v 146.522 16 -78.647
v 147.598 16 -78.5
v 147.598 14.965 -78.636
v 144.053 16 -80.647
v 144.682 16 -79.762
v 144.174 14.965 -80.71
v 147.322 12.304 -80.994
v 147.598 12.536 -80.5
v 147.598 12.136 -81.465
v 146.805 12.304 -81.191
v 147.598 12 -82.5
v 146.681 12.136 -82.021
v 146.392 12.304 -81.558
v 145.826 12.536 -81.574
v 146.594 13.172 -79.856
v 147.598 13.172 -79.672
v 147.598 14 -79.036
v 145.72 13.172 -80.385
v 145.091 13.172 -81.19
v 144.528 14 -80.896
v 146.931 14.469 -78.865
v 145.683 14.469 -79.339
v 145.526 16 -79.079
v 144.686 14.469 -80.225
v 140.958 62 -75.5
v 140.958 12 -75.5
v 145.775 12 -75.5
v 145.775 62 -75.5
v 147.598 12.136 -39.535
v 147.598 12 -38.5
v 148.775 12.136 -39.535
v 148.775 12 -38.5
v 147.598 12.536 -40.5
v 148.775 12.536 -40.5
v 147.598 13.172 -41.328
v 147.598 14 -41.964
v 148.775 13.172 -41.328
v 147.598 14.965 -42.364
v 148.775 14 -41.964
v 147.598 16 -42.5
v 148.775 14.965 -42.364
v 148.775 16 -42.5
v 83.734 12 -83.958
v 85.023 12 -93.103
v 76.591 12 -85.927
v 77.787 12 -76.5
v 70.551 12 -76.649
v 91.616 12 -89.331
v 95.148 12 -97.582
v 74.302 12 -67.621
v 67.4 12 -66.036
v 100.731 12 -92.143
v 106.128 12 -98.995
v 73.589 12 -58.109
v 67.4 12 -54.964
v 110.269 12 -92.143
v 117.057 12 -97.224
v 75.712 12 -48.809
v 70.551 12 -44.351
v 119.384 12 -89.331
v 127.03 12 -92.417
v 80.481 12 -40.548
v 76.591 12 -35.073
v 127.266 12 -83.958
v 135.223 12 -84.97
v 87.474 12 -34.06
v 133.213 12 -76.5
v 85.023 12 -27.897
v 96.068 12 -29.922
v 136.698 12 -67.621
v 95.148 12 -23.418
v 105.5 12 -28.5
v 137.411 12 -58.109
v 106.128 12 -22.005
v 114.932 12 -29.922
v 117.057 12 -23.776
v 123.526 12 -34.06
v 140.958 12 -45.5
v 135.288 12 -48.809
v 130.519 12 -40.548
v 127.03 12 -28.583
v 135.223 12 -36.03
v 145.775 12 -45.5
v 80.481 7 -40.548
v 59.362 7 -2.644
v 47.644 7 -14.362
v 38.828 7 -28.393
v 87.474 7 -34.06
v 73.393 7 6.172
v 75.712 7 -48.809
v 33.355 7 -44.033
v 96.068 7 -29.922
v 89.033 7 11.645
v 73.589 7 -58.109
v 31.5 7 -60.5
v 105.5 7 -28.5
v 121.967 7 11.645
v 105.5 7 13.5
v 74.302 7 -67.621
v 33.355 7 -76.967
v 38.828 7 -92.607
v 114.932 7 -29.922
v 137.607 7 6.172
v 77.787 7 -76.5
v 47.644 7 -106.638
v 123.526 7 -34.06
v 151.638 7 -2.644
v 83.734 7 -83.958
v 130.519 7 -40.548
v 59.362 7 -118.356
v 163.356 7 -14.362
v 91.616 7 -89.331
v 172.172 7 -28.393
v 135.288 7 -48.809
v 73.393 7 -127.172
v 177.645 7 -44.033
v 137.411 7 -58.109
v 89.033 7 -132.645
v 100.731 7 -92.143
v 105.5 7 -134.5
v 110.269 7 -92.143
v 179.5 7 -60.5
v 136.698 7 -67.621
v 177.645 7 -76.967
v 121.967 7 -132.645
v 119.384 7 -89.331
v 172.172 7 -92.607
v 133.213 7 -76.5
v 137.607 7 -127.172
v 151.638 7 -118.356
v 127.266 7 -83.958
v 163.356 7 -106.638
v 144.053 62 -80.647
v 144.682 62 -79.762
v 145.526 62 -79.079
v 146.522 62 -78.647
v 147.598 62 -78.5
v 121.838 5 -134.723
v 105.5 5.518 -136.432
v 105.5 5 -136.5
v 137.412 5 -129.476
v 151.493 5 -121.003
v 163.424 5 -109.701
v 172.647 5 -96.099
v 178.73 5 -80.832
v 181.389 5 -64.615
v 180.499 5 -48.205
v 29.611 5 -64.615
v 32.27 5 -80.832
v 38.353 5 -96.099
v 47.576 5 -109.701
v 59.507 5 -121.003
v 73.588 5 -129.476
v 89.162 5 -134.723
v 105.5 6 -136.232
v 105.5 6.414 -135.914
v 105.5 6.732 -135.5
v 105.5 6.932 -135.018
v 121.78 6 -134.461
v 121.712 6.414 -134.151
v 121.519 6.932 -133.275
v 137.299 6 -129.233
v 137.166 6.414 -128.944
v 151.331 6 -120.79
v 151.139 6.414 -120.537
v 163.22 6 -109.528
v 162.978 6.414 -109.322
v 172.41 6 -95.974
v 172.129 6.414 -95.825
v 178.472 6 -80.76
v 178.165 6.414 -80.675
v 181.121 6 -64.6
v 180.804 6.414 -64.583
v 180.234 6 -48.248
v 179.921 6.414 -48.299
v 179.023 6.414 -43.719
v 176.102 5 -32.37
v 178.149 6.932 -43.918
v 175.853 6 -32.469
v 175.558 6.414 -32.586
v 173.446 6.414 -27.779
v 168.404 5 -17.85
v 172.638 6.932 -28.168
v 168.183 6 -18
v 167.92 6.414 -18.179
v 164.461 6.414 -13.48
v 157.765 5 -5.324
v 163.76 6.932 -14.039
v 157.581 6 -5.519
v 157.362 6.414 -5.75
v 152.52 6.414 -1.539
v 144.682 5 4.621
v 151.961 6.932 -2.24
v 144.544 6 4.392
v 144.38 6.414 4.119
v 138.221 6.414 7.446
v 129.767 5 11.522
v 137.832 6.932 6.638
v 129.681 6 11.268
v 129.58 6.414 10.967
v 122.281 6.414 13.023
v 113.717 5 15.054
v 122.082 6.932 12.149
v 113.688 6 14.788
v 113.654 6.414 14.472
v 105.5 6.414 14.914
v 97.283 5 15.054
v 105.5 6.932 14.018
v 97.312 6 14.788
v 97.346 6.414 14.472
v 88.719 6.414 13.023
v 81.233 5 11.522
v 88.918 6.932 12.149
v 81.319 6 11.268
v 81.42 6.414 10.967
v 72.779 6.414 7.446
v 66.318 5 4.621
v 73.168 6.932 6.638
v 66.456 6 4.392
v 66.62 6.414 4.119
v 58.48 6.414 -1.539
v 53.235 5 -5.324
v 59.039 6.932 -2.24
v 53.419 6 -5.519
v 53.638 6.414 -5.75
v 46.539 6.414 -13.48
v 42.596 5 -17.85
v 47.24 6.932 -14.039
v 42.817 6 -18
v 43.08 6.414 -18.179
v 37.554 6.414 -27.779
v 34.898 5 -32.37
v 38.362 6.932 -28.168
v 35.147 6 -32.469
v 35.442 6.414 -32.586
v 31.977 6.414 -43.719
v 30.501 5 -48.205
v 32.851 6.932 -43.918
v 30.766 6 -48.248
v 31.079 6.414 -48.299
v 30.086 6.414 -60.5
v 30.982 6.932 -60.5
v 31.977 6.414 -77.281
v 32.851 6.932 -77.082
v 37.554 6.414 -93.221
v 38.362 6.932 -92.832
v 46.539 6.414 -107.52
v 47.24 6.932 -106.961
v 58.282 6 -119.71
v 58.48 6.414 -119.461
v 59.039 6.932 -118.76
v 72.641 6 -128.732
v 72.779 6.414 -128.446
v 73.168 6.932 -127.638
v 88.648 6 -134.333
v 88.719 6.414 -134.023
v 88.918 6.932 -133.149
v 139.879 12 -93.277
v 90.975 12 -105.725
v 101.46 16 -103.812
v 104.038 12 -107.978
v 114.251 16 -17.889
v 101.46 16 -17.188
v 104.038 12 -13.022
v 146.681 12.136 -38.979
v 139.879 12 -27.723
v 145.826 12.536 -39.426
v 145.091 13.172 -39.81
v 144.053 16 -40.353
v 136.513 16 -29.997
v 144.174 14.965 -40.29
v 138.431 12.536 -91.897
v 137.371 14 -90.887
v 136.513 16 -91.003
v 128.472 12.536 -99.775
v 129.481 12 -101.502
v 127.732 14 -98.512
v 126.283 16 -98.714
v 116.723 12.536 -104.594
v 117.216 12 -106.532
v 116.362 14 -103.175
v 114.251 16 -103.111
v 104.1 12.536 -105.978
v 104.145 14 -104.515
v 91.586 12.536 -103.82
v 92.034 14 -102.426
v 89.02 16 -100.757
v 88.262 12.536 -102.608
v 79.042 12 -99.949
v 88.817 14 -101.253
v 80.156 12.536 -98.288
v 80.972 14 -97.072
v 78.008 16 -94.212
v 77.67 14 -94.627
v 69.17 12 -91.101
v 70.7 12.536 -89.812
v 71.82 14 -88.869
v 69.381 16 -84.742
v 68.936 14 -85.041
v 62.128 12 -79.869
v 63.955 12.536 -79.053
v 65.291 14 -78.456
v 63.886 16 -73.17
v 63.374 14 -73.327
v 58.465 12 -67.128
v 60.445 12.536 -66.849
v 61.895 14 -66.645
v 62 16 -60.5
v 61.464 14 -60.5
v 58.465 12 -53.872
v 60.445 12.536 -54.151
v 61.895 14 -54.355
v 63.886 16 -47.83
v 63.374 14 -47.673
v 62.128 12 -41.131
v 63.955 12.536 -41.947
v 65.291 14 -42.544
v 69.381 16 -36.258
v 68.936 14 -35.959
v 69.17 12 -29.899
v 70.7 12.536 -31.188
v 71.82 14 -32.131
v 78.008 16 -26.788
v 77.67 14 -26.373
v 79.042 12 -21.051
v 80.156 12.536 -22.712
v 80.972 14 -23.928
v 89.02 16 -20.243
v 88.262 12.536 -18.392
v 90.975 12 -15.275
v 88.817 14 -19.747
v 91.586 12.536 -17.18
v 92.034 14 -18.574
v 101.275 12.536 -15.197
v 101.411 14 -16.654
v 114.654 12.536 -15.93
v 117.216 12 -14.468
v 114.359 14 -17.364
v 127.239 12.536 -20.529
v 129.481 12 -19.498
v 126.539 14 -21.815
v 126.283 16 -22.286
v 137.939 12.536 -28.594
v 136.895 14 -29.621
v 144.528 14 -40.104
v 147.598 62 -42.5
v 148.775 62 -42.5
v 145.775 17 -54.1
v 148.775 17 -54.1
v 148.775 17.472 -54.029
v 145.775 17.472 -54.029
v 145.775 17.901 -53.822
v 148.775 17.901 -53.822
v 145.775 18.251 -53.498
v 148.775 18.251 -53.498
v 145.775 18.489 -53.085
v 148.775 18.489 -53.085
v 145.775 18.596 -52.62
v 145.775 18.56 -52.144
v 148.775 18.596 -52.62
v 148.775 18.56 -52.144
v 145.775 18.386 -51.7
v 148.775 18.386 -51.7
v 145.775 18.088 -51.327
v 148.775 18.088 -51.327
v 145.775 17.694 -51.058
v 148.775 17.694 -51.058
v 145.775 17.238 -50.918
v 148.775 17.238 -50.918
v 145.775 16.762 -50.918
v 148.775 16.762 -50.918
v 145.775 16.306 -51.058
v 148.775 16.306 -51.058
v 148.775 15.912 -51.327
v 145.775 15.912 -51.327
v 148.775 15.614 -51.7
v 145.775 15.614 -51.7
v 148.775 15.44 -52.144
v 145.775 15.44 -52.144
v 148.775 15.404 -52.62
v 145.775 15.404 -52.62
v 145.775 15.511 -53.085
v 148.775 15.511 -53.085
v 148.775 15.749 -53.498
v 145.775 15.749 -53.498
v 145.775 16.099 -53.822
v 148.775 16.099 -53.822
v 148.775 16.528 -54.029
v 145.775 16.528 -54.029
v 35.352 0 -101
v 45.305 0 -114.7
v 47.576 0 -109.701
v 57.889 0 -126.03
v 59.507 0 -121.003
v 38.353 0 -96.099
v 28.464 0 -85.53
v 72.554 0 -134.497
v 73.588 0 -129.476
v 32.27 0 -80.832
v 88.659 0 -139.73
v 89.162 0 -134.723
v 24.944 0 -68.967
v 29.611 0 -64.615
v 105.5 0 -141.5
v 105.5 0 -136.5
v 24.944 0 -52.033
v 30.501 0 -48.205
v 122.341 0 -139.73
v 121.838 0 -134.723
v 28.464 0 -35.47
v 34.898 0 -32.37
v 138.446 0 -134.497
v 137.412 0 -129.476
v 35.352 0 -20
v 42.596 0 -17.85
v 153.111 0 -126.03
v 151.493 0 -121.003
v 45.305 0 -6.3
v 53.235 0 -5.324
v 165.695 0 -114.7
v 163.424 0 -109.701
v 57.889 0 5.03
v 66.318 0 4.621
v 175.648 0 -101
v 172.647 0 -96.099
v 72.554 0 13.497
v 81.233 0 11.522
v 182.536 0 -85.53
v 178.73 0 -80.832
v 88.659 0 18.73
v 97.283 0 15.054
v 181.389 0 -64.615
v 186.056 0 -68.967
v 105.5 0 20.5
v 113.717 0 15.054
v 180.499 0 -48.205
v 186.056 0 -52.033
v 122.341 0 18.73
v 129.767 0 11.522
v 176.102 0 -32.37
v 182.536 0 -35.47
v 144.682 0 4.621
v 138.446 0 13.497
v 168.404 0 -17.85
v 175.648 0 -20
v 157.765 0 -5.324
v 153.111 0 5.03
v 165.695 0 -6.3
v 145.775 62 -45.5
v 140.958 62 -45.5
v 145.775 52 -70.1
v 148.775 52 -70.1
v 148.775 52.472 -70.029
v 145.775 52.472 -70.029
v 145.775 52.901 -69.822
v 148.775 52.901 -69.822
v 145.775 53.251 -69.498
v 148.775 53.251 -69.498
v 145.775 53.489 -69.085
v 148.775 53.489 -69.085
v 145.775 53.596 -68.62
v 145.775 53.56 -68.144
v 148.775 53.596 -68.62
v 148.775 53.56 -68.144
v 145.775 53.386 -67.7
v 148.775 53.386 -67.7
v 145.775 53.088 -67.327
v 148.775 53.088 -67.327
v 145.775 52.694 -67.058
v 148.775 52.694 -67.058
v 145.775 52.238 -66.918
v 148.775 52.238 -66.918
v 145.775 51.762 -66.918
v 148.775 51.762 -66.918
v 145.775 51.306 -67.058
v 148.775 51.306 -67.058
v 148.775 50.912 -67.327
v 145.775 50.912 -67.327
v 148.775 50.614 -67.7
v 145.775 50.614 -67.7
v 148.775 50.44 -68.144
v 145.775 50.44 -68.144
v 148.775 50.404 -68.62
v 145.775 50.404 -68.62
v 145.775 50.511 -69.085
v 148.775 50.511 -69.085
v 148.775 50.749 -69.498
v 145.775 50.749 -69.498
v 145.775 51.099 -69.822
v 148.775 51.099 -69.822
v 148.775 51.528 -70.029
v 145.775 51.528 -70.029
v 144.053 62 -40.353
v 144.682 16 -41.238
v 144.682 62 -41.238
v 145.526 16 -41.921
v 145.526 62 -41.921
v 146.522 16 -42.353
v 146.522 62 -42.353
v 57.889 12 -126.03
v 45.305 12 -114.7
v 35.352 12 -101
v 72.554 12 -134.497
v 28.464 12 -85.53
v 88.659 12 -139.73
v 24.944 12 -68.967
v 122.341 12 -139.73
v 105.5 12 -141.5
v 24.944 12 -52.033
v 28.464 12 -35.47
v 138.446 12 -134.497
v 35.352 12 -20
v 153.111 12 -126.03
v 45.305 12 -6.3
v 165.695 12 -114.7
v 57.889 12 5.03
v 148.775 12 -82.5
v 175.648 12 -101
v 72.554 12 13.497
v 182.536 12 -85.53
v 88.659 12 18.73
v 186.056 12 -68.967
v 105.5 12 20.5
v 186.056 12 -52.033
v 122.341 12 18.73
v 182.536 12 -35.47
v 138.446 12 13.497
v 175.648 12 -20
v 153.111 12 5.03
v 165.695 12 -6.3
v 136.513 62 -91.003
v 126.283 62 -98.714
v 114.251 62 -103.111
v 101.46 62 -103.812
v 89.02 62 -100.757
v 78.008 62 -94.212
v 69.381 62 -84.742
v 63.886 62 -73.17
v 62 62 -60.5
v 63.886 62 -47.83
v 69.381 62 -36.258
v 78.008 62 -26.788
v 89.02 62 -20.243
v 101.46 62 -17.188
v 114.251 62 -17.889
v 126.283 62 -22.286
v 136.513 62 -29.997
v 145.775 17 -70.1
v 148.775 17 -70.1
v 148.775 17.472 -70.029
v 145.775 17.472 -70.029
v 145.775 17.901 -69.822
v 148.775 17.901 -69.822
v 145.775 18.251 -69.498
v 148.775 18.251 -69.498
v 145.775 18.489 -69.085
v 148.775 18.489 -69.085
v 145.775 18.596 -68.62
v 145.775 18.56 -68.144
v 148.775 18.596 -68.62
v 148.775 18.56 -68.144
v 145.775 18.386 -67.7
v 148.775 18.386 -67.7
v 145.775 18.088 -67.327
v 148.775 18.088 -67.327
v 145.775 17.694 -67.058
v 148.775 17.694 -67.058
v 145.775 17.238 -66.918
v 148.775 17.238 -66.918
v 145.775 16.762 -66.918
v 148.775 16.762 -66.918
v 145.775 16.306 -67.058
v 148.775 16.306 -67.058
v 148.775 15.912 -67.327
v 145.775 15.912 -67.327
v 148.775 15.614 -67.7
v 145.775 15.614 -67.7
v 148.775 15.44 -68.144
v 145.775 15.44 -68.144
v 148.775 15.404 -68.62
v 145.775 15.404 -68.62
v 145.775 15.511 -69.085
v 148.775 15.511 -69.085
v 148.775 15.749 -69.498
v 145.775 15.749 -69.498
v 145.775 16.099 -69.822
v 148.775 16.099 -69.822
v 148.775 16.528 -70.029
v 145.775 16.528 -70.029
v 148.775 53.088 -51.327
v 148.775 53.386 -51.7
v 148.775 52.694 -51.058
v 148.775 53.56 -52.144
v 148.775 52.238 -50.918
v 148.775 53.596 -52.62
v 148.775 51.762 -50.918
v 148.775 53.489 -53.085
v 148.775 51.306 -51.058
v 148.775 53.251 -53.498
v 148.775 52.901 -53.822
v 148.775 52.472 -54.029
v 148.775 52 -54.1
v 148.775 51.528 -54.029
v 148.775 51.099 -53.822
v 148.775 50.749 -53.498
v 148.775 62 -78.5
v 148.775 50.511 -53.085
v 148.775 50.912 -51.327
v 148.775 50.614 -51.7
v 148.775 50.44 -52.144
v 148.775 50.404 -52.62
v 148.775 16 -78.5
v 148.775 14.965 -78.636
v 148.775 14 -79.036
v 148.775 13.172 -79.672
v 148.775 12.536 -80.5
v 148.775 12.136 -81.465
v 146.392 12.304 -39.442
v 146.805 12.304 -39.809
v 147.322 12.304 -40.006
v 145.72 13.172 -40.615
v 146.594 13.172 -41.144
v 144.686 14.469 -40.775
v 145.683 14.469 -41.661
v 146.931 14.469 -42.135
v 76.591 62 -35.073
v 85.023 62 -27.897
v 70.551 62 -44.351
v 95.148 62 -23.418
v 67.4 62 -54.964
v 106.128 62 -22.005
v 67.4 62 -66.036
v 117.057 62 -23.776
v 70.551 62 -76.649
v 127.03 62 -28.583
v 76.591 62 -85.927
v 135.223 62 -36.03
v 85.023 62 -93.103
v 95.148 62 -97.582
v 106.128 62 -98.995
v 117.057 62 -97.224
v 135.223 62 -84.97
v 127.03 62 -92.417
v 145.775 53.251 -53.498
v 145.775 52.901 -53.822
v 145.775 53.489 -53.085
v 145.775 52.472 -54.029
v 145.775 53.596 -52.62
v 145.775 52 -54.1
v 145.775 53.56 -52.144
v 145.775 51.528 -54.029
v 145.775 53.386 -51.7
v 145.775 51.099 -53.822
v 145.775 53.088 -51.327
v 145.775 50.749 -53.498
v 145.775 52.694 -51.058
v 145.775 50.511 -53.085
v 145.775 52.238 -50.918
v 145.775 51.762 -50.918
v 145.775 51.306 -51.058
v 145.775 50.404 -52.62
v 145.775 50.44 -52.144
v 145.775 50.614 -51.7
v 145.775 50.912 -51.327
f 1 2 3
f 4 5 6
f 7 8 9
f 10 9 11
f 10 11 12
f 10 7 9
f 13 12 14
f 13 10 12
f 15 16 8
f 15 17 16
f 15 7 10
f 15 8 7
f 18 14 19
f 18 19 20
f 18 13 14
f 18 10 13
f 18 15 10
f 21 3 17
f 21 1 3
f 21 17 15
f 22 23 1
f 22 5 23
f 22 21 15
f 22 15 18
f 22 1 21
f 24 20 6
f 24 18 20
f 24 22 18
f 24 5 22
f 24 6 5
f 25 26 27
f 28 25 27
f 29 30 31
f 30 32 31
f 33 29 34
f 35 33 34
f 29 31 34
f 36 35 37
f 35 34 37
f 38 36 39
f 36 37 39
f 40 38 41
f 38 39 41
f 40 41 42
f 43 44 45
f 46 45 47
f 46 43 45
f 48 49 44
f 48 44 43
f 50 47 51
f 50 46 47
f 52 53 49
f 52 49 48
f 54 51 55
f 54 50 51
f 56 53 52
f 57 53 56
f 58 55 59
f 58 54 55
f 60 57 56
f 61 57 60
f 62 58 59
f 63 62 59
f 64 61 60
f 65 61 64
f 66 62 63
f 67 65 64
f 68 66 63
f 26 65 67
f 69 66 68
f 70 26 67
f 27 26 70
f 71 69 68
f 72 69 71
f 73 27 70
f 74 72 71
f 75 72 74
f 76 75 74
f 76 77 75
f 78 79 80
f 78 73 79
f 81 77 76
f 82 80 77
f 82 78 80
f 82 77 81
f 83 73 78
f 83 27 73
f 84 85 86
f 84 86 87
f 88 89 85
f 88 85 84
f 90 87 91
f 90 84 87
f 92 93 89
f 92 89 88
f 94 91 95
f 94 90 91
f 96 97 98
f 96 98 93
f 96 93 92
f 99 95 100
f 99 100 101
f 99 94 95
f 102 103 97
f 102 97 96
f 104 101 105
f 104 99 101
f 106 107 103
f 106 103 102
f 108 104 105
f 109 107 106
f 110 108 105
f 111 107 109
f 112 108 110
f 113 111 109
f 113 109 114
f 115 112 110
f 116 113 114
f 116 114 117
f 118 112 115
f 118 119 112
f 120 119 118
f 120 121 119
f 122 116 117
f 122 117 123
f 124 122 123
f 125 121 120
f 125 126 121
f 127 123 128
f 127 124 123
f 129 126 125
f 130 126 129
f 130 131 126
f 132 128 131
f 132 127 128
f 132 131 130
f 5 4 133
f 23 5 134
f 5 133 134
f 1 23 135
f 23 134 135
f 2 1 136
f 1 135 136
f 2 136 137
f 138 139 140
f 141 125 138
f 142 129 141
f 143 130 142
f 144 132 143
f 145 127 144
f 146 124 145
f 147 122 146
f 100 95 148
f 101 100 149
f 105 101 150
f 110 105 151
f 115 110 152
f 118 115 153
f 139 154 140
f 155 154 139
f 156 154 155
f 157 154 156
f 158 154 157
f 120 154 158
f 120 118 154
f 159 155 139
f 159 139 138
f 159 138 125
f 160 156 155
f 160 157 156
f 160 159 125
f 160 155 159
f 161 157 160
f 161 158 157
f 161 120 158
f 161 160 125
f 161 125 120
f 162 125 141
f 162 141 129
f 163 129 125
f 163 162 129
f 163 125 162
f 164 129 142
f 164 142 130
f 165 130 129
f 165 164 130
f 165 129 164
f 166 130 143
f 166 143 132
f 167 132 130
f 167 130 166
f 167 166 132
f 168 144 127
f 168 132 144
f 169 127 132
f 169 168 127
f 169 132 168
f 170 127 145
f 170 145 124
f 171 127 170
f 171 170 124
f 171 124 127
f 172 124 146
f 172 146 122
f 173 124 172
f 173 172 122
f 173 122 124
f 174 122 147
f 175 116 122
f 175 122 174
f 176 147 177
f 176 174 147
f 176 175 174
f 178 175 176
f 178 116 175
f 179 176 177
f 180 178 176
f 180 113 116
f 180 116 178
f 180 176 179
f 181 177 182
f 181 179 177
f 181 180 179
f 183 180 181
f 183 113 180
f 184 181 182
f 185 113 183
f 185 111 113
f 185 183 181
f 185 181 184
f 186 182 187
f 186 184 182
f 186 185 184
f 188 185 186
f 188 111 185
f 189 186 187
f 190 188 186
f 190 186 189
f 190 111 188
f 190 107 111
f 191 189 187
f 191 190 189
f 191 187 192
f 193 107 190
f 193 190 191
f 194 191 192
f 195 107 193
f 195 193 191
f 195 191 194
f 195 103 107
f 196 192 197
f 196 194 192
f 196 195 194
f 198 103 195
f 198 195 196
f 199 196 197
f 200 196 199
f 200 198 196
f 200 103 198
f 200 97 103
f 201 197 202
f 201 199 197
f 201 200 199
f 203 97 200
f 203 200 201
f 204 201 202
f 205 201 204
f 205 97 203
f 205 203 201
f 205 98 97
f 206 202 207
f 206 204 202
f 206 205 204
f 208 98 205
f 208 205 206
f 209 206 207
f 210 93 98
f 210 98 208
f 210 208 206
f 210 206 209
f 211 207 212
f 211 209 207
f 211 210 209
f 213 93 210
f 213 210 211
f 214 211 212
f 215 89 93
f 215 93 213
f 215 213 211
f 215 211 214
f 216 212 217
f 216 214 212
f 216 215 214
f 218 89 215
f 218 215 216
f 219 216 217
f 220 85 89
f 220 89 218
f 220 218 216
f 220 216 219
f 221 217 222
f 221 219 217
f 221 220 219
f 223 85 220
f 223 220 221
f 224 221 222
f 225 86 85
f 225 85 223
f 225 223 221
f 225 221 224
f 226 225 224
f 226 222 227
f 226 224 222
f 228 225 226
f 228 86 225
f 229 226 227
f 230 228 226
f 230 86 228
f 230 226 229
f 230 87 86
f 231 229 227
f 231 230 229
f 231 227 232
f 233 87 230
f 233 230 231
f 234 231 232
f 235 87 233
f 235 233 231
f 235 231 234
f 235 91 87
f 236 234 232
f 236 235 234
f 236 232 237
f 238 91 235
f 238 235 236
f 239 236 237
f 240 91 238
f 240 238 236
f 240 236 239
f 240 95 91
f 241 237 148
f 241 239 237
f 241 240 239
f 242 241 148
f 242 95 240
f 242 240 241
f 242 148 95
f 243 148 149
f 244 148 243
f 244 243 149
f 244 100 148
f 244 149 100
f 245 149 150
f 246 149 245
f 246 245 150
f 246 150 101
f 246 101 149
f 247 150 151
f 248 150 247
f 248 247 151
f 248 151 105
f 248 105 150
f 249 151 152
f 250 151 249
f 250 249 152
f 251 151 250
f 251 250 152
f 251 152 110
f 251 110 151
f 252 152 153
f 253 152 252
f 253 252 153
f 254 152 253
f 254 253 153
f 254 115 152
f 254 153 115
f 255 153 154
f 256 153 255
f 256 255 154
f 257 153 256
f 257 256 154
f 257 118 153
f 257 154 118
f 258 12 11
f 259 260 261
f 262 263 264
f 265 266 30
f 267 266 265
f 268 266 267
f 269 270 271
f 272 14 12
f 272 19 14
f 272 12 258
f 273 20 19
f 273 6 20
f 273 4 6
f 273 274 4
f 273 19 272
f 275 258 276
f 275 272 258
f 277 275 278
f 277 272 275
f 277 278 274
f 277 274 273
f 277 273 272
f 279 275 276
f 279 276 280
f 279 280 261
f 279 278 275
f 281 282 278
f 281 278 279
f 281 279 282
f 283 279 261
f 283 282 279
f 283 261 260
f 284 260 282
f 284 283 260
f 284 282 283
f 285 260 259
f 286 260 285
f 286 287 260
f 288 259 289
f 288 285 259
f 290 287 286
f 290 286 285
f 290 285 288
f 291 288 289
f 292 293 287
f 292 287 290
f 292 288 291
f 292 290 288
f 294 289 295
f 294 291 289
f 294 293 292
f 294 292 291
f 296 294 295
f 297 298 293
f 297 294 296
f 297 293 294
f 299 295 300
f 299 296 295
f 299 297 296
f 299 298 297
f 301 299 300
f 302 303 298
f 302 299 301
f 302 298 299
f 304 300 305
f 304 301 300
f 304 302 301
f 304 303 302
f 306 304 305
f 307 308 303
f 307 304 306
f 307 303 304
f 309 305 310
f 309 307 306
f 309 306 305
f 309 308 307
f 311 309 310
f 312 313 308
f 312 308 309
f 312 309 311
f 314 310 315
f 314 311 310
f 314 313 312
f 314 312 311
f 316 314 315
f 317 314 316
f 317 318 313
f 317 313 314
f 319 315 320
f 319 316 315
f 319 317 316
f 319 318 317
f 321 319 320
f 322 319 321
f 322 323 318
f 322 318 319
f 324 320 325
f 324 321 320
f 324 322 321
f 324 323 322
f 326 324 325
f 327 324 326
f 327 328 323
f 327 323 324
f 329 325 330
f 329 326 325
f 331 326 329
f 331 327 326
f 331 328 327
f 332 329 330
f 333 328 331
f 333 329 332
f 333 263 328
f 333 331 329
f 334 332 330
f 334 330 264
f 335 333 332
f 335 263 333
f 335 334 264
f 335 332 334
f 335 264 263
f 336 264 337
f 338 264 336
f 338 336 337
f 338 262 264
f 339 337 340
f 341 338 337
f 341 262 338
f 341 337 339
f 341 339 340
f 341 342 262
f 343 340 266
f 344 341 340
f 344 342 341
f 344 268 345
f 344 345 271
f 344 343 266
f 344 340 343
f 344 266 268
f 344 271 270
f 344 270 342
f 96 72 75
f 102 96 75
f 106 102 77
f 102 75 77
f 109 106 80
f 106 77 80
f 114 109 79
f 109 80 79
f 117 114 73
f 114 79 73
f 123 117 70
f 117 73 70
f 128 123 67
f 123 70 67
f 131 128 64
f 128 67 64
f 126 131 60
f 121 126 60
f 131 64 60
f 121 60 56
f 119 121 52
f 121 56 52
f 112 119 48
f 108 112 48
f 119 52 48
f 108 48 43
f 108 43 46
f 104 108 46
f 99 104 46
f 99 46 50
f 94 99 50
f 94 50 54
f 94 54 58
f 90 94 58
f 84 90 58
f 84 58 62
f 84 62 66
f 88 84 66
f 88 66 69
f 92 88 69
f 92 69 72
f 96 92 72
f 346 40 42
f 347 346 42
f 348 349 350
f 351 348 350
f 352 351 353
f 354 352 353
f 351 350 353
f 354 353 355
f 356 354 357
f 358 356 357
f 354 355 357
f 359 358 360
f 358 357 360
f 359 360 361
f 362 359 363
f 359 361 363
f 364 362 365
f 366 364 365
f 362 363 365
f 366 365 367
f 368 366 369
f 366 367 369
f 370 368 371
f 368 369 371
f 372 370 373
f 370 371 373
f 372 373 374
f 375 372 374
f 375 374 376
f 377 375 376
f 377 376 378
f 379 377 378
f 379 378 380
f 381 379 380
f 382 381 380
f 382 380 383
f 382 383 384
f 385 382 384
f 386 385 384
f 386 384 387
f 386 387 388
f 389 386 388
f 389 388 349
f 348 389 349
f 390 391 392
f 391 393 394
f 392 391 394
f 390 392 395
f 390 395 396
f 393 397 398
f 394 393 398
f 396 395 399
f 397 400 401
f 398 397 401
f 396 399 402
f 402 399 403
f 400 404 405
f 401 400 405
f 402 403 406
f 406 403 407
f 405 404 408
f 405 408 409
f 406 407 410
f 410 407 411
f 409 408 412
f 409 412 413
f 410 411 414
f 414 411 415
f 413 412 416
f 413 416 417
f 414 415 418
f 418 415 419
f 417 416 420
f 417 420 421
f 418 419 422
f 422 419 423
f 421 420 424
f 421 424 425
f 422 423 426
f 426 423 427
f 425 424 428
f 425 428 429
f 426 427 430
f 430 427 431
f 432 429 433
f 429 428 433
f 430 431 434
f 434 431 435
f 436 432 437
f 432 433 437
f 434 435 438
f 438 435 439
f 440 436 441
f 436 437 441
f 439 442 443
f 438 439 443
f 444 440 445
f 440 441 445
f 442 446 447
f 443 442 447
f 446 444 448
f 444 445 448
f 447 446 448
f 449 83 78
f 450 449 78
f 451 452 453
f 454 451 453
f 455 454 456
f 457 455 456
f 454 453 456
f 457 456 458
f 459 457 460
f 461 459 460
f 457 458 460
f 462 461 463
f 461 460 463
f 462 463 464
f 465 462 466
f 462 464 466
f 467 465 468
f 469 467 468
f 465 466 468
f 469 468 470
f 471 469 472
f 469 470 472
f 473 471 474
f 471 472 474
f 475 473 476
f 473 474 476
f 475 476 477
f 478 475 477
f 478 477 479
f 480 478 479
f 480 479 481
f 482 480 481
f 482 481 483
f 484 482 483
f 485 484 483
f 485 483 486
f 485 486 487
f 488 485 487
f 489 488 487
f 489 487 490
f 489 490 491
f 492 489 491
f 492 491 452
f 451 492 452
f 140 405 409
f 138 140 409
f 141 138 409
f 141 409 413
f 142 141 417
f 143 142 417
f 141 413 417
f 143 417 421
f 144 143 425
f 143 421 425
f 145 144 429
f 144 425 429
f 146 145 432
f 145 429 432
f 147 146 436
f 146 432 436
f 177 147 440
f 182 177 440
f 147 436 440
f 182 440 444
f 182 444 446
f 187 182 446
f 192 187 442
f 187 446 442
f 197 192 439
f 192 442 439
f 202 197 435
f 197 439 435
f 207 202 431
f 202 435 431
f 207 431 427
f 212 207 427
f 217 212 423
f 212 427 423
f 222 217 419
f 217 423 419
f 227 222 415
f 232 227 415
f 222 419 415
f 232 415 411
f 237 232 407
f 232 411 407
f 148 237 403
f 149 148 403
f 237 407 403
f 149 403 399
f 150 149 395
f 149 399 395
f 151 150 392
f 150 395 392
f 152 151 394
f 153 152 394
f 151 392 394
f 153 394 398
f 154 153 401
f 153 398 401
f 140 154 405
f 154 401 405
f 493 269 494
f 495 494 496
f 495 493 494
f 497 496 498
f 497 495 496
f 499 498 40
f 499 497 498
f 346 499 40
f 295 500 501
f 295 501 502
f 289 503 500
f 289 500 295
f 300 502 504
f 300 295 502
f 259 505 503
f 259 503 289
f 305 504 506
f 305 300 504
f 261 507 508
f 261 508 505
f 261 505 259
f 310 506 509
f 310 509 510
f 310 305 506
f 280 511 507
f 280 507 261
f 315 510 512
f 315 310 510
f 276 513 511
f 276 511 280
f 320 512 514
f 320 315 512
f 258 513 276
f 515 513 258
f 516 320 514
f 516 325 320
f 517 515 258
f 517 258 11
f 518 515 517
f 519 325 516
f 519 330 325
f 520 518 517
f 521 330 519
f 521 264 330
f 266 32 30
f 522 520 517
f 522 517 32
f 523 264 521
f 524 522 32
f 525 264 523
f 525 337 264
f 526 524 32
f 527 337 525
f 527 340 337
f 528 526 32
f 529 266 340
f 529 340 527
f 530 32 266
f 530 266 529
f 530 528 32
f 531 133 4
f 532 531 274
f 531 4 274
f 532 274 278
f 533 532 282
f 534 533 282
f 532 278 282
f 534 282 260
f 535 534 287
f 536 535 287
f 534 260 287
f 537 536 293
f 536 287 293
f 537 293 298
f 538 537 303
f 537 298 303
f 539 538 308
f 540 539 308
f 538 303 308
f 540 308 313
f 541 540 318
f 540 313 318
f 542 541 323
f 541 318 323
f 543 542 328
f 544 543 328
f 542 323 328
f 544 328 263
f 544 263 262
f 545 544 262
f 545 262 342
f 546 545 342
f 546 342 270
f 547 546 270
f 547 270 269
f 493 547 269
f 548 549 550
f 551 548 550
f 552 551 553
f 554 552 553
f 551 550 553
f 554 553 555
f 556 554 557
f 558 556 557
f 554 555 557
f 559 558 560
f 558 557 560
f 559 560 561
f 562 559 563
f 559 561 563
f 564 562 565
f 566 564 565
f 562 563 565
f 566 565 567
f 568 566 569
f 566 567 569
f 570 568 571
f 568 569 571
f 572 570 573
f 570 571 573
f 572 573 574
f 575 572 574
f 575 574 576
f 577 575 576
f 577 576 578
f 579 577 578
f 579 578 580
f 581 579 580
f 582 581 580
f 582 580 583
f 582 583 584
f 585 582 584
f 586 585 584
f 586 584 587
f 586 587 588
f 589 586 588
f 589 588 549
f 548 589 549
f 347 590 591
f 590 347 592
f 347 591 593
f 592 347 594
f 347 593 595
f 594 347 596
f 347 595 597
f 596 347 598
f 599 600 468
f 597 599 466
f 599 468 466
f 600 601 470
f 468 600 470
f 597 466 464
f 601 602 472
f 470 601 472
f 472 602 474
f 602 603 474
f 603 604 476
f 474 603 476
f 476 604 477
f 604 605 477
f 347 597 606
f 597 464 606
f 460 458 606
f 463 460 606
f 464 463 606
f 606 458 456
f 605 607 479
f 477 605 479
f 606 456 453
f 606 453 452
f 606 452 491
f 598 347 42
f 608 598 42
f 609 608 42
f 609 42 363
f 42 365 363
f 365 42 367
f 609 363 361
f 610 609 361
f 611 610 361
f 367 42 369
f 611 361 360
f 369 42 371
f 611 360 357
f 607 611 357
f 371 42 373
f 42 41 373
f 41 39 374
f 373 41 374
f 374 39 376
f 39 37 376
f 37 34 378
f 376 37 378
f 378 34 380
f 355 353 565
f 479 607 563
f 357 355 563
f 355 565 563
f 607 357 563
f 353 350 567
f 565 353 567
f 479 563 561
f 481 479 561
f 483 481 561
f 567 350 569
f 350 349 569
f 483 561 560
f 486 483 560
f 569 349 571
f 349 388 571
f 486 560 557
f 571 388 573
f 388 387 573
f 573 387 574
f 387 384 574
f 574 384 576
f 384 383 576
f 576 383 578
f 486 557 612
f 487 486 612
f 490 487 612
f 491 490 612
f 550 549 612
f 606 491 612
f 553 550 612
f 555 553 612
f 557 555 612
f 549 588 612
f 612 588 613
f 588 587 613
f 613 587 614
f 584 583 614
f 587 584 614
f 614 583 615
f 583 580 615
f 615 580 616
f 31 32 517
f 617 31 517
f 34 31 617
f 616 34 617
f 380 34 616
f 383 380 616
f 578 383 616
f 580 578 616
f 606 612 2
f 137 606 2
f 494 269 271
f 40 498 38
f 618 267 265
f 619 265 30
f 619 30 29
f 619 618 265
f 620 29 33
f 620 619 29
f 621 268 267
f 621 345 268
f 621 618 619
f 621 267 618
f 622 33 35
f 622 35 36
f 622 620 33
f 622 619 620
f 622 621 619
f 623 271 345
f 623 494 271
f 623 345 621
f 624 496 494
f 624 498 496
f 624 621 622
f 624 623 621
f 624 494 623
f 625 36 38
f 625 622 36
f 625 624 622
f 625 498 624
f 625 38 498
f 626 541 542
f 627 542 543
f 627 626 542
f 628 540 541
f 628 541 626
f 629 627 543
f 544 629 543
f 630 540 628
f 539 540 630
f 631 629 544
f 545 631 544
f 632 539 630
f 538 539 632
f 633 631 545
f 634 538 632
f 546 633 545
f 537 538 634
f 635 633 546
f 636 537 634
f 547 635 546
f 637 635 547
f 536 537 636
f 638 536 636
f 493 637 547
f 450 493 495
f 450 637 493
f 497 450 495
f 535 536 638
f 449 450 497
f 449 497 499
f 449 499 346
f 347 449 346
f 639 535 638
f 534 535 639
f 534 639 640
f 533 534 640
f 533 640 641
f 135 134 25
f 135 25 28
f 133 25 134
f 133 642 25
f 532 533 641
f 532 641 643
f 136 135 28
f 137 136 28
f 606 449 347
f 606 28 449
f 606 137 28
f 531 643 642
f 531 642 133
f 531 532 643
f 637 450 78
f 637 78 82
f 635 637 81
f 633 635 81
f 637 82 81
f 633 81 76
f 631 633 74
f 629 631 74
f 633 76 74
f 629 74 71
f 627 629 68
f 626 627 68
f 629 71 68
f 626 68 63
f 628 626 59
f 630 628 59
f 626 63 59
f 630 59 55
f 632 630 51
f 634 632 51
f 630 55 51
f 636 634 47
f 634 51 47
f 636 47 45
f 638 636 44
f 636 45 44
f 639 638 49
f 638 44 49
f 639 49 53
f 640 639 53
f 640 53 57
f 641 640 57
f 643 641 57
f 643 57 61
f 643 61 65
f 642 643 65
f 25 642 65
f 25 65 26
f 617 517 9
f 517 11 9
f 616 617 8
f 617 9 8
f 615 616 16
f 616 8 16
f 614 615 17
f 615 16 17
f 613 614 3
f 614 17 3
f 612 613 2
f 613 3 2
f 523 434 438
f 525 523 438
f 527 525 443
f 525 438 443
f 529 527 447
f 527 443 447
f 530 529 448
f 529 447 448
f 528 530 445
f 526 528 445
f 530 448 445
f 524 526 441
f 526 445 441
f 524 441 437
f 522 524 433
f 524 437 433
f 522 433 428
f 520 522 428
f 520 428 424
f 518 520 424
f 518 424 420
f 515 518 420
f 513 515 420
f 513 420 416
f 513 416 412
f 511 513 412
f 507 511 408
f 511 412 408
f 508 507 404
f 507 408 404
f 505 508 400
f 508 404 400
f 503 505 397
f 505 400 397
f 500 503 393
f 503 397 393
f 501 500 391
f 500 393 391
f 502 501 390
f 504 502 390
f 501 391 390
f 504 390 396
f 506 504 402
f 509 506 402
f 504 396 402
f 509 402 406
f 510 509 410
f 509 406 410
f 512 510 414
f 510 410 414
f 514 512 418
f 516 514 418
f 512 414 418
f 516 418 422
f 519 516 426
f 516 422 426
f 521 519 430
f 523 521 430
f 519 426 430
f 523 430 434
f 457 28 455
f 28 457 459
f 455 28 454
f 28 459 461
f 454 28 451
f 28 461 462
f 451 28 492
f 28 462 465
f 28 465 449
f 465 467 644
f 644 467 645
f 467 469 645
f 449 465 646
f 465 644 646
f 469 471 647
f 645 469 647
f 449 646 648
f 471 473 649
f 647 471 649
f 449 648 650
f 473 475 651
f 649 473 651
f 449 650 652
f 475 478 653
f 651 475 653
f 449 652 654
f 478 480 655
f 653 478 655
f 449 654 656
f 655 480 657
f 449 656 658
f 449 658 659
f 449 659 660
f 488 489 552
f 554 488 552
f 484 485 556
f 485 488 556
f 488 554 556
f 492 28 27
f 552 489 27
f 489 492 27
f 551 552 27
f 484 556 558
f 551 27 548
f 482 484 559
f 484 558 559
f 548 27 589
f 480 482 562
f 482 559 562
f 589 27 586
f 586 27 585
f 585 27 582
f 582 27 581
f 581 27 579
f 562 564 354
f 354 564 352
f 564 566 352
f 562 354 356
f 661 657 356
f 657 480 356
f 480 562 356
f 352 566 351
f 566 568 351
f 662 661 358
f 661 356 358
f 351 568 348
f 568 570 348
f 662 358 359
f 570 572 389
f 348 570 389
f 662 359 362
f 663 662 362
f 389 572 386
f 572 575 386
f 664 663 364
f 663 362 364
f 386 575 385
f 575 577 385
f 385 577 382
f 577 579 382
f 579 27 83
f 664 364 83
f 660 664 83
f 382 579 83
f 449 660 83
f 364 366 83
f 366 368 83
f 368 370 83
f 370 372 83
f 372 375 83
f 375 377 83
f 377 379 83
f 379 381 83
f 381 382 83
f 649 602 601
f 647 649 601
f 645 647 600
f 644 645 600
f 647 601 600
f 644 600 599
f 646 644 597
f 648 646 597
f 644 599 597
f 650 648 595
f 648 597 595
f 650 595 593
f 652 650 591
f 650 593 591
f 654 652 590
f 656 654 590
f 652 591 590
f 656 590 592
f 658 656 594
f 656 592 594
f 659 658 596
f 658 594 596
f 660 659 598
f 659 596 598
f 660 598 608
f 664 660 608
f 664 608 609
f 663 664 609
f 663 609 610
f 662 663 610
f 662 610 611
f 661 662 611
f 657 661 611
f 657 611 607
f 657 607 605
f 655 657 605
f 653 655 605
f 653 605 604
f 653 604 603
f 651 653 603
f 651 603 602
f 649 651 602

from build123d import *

# Parameters (mm, degrees)
SKETCH1_R           = 81
BOSS_EXTRUDE1_DEPTH = 12
SKETCH2_R           = 76
CUT_EXTRUDE1_DEPTH  = 7
SKETCH3_R           = 32
CUT_EXTRUDE2_DEPTH  = 235.410963907
BOSS_EXTRUDE2_DEPTH = 50
SKETCH5_R           = 1.6
CUT_EXTRUDE3_DEPTH  = 6
FILLET1_R           = 4
FILLET2_R           = 2


with BuildPart() as part:
    # Sketch1 → Boss-Extrude1 (new body)
    with BuildSketch(Plane(origin=(0, 0, 0), x_dir=(1, 0, 0), z_dir=(0, 1, 0))):
        with Locations(Location((105.5, 60.5, 0), (0, 0, 270))):
            Circle(SKETCH1_R)
    extrude(amount=BOSS_EXTRUDE1_DEPTH)

    # Sketch2 → Cut-Extrude1 (cut)
    with BuildSketch(Plane.XZ):
        with Locations(Location((105.5, -60.5, 0), (0, 0, 270))):
            Circle(SKETCH2_R)
    extrude(amount=-CUT_EXTRUDE1_DEPTH, mode=Mode.SUBTRACT)

    # Sketch3 → Cut-Extrude2 (cut, through all)
    with BuildSketch(Plane(origin=(0, 12, 0), x_dir=(1, 0, 0), z_dir=(0, 1, 0))):
        with Locations(Location((105.5, 60.5, 0), (0, 0, 270))):
            Circle(SKETCH3_R)
    extrude(amount=-CUT_EXTRUDE2_DEPTH, mode=Mode.SUBTRACT)

    # Sketch4 → Boss-Extrude2 (add)
    with BuildSketch(Plane(origin=(0, 12, 0), x_dir=(1, 0, 0), z_dir=(0, 1, 0))):
        with BuildLine():
            ThreePointArc((140.957721303, 45.5), (67, 60.5), (140.957721303, 75.5))
            Line((140.957721303, 75.5), (145.775366264, 75.5))
            Line((145.775366264, 75.5), (146.331972766, 75.5))
            ThreePointArc((146.331972766, 75.5), (145.74451839, 77.011472968), (145.101136347, 78.5))
            ThreePointArc((145.101136347, 78.5), (62, 60.5), (145.101136347, 42.5))
            ThreePointArc((145.101136347, 42.5), (145.74451839, 43.988527032), (146.331972766, 45.5))
            Line((146.331972766, 45.5), (145.775366264, 45.5))
            Line((145.775366264, 45.5), (140.957721303, 45.5))
        make_face()
        with BuildLine():
            Line((146.331972766, 75.5), (145.775366264, 75.5))
            Line((145.775366264, 75.5), (145.775366264, 45.5))
            Line((145.775366264, 45.5), (146.331972766, 45.5))
            ThreePointArc((146.331972766, 45.5), (147.885391427, 50.715900981), (148.775366264, 56.084949069))
            Line((148.775366264, 56.084949069), (148.775366264, 64.915050931))
            ThreePointArc((148.775366264, 64.915050931), (147.885391427, 70.284099019), (146.331972766, 75.5))
        make_face()
        with BuildLine():
            ThreePointArc((145.101136347, 78.5), (145.74451839, 77.011472968), (146.331972766, 75.5))
            Line((146.331972766, 75.5), (148.775366264, 75.5))
            Line((148.775366264, 75.5), (148.775366264, 78.5))
            Line((148.775366264, 78.5), (145.101136347, 78.5))
        make_face()
        with BuildLine():
            Line((148.775366264, 75.5), (146.331972766, 75.5))
            ThreePointArc((146.331972766, 75.5), (147.885391427, 70.284099019), (148.775366264, 64.915050931))
            Line((148.775366264, 64.915050931), (148.775366264, 75.5))
        make_face()
        with BuildLine():
            ThreePointArc((148.775366264, 56.084949069), (147.885391427, 50.715900981), (146.331972766, 45.5))
            Line((146.331972766, 45.5), (148.775366264, 45.5))
            Line((148.775366264, 45.5), (148.775366264, 56.084949069))
        make_face()
        with BuildLine():
            Line((148.775366264, 45.5), (146.331972766, 45.5))
            ThreePointArc((146.331972766, 45.5), (145.74451839, 43.988527032), (145.101136347, 42.5))
            Line((145.101136347, 42.5), (148.775366264, 42.5))
            Line((148.775366264, 42.5), (148.775366264, 45.5))
        make_face()
    extrude(amount=BOSS_EXTRUDE2_DEPTH)

    # Sketch5 → Cut-Extrude3 (cut)
    with BuildSketch(Plane(origin=(148.775366264, 0, 0), x_dir=(0, 0, -1), z_dir=(1, 0, 0))):
        with Locations((52.5, 52)):
            Circle(SKETCH5_R)
        with Locations((68.5, 52)):
            Circle(SKETCH5_R)
        with Locations((68.5, 17)):
            Circle(SKETCH5_R)
        with Locations((52.5, 17)):
            Circle(SKETCH5_R)
    extrude(amount=-CUT_EXTRUDE3_DEPTH, mode=Mode.SUBTRACT)

    # Fillet1
    fillet1_edges = [part.edges().sort_by_distance(p)[0] for p in [
        (146.938251306, 12, -42.5),
        (145.101136347, 37, -42.5),
        (62, 12, -60.5),
        (145.101136347, 37, -78.5),
        (146.938251306, 12, -78.5),
    ]]
    fillet(fillet1_edges, radius=FILLET1_R)

    # Fillet2
    fillet2_edges = [part.edges().sort_by_distance(p)[0] for p in [
        (105.5, 7, 15.5),
    ]]
    fillet(fillet2_edges, radius=FILLET2_R)


solid = part.part
